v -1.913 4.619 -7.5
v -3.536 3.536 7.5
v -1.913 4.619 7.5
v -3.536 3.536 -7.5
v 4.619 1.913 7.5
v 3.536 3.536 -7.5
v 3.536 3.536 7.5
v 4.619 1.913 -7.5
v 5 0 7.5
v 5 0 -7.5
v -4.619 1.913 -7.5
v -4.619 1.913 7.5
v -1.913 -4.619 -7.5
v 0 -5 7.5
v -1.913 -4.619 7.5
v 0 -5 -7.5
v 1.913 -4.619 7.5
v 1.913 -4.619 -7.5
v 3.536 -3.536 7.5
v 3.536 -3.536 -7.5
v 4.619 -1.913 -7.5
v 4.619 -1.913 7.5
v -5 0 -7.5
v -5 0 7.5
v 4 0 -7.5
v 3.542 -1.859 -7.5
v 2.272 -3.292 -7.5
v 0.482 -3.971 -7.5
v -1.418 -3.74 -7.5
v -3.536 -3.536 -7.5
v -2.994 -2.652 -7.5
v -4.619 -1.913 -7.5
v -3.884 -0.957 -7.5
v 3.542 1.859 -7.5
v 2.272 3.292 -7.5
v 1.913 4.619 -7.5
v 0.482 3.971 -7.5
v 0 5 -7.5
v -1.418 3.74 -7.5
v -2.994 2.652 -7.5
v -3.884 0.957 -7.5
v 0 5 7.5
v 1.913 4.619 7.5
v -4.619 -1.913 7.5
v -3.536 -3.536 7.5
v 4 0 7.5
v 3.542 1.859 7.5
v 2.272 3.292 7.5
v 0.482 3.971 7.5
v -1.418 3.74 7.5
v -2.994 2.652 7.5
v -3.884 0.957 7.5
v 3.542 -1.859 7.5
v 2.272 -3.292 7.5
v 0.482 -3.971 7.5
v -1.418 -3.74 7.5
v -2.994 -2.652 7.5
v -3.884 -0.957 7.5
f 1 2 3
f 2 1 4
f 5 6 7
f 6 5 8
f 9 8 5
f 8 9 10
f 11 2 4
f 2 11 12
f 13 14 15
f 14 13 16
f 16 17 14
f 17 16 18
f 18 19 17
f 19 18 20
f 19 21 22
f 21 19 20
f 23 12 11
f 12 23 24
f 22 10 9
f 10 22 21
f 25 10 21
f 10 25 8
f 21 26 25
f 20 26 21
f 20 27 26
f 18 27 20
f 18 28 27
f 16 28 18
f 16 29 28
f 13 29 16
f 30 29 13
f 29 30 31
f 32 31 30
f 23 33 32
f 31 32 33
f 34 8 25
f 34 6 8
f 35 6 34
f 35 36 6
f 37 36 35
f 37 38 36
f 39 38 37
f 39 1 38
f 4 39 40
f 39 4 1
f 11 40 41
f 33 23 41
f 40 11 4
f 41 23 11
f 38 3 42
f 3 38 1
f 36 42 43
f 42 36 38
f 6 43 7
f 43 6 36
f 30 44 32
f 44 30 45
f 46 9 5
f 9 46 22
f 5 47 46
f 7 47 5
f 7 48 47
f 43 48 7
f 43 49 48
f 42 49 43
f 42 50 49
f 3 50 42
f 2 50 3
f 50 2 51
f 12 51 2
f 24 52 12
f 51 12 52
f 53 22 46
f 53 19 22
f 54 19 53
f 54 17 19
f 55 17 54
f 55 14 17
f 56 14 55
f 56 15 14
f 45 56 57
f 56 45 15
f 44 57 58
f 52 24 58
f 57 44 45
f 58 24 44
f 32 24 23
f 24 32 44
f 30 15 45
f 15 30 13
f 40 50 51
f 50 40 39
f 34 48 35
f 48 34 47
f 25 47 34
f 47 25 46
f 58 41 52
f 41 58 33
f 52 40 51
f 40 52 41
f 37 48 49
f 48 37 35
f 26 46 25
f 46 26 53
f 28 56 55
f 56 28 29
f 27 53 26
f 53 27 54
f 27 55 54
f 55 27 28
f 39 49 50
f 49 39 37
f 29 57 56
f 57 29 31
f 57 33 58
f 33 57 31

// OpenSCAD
// Parameters
length_mm = 15; //[8:30:1]
outer_diameter_mm = 10; //[5:20:0.5]
inner_diameter_mm = 8; //[4:18:0.5]
forced_inner_diameter_mm = 0; //[0:18:0.5]
center = 1; //[0:1:1]
z_center_offset_mm = 0; //[-50:50:1]
overlap_mm = 1; //[0.5:2:0.1]

// Tubing - complete geometry
module tubing() {
  color([0.85, 0.85, 0.8]) { // PVC color
    difference() {
      // Outer tube
      cylinder(r=outer_diameter_mm/2, h=length_mm, center=true);
      // Inner tube
      cylinder(r=((forced_inner_diameter_mm > 0) ? forced_inner_diameter_mm : inner_diameter_mm)/2, 
               h=length_mm + 2*overlap_mm, center=true);
    }
  }
}

// Assembly
module assembly() {
  translate([0, 0, ((center > 0) ? 0 : (length_mm/2))]) tubing();
}

assembly();
